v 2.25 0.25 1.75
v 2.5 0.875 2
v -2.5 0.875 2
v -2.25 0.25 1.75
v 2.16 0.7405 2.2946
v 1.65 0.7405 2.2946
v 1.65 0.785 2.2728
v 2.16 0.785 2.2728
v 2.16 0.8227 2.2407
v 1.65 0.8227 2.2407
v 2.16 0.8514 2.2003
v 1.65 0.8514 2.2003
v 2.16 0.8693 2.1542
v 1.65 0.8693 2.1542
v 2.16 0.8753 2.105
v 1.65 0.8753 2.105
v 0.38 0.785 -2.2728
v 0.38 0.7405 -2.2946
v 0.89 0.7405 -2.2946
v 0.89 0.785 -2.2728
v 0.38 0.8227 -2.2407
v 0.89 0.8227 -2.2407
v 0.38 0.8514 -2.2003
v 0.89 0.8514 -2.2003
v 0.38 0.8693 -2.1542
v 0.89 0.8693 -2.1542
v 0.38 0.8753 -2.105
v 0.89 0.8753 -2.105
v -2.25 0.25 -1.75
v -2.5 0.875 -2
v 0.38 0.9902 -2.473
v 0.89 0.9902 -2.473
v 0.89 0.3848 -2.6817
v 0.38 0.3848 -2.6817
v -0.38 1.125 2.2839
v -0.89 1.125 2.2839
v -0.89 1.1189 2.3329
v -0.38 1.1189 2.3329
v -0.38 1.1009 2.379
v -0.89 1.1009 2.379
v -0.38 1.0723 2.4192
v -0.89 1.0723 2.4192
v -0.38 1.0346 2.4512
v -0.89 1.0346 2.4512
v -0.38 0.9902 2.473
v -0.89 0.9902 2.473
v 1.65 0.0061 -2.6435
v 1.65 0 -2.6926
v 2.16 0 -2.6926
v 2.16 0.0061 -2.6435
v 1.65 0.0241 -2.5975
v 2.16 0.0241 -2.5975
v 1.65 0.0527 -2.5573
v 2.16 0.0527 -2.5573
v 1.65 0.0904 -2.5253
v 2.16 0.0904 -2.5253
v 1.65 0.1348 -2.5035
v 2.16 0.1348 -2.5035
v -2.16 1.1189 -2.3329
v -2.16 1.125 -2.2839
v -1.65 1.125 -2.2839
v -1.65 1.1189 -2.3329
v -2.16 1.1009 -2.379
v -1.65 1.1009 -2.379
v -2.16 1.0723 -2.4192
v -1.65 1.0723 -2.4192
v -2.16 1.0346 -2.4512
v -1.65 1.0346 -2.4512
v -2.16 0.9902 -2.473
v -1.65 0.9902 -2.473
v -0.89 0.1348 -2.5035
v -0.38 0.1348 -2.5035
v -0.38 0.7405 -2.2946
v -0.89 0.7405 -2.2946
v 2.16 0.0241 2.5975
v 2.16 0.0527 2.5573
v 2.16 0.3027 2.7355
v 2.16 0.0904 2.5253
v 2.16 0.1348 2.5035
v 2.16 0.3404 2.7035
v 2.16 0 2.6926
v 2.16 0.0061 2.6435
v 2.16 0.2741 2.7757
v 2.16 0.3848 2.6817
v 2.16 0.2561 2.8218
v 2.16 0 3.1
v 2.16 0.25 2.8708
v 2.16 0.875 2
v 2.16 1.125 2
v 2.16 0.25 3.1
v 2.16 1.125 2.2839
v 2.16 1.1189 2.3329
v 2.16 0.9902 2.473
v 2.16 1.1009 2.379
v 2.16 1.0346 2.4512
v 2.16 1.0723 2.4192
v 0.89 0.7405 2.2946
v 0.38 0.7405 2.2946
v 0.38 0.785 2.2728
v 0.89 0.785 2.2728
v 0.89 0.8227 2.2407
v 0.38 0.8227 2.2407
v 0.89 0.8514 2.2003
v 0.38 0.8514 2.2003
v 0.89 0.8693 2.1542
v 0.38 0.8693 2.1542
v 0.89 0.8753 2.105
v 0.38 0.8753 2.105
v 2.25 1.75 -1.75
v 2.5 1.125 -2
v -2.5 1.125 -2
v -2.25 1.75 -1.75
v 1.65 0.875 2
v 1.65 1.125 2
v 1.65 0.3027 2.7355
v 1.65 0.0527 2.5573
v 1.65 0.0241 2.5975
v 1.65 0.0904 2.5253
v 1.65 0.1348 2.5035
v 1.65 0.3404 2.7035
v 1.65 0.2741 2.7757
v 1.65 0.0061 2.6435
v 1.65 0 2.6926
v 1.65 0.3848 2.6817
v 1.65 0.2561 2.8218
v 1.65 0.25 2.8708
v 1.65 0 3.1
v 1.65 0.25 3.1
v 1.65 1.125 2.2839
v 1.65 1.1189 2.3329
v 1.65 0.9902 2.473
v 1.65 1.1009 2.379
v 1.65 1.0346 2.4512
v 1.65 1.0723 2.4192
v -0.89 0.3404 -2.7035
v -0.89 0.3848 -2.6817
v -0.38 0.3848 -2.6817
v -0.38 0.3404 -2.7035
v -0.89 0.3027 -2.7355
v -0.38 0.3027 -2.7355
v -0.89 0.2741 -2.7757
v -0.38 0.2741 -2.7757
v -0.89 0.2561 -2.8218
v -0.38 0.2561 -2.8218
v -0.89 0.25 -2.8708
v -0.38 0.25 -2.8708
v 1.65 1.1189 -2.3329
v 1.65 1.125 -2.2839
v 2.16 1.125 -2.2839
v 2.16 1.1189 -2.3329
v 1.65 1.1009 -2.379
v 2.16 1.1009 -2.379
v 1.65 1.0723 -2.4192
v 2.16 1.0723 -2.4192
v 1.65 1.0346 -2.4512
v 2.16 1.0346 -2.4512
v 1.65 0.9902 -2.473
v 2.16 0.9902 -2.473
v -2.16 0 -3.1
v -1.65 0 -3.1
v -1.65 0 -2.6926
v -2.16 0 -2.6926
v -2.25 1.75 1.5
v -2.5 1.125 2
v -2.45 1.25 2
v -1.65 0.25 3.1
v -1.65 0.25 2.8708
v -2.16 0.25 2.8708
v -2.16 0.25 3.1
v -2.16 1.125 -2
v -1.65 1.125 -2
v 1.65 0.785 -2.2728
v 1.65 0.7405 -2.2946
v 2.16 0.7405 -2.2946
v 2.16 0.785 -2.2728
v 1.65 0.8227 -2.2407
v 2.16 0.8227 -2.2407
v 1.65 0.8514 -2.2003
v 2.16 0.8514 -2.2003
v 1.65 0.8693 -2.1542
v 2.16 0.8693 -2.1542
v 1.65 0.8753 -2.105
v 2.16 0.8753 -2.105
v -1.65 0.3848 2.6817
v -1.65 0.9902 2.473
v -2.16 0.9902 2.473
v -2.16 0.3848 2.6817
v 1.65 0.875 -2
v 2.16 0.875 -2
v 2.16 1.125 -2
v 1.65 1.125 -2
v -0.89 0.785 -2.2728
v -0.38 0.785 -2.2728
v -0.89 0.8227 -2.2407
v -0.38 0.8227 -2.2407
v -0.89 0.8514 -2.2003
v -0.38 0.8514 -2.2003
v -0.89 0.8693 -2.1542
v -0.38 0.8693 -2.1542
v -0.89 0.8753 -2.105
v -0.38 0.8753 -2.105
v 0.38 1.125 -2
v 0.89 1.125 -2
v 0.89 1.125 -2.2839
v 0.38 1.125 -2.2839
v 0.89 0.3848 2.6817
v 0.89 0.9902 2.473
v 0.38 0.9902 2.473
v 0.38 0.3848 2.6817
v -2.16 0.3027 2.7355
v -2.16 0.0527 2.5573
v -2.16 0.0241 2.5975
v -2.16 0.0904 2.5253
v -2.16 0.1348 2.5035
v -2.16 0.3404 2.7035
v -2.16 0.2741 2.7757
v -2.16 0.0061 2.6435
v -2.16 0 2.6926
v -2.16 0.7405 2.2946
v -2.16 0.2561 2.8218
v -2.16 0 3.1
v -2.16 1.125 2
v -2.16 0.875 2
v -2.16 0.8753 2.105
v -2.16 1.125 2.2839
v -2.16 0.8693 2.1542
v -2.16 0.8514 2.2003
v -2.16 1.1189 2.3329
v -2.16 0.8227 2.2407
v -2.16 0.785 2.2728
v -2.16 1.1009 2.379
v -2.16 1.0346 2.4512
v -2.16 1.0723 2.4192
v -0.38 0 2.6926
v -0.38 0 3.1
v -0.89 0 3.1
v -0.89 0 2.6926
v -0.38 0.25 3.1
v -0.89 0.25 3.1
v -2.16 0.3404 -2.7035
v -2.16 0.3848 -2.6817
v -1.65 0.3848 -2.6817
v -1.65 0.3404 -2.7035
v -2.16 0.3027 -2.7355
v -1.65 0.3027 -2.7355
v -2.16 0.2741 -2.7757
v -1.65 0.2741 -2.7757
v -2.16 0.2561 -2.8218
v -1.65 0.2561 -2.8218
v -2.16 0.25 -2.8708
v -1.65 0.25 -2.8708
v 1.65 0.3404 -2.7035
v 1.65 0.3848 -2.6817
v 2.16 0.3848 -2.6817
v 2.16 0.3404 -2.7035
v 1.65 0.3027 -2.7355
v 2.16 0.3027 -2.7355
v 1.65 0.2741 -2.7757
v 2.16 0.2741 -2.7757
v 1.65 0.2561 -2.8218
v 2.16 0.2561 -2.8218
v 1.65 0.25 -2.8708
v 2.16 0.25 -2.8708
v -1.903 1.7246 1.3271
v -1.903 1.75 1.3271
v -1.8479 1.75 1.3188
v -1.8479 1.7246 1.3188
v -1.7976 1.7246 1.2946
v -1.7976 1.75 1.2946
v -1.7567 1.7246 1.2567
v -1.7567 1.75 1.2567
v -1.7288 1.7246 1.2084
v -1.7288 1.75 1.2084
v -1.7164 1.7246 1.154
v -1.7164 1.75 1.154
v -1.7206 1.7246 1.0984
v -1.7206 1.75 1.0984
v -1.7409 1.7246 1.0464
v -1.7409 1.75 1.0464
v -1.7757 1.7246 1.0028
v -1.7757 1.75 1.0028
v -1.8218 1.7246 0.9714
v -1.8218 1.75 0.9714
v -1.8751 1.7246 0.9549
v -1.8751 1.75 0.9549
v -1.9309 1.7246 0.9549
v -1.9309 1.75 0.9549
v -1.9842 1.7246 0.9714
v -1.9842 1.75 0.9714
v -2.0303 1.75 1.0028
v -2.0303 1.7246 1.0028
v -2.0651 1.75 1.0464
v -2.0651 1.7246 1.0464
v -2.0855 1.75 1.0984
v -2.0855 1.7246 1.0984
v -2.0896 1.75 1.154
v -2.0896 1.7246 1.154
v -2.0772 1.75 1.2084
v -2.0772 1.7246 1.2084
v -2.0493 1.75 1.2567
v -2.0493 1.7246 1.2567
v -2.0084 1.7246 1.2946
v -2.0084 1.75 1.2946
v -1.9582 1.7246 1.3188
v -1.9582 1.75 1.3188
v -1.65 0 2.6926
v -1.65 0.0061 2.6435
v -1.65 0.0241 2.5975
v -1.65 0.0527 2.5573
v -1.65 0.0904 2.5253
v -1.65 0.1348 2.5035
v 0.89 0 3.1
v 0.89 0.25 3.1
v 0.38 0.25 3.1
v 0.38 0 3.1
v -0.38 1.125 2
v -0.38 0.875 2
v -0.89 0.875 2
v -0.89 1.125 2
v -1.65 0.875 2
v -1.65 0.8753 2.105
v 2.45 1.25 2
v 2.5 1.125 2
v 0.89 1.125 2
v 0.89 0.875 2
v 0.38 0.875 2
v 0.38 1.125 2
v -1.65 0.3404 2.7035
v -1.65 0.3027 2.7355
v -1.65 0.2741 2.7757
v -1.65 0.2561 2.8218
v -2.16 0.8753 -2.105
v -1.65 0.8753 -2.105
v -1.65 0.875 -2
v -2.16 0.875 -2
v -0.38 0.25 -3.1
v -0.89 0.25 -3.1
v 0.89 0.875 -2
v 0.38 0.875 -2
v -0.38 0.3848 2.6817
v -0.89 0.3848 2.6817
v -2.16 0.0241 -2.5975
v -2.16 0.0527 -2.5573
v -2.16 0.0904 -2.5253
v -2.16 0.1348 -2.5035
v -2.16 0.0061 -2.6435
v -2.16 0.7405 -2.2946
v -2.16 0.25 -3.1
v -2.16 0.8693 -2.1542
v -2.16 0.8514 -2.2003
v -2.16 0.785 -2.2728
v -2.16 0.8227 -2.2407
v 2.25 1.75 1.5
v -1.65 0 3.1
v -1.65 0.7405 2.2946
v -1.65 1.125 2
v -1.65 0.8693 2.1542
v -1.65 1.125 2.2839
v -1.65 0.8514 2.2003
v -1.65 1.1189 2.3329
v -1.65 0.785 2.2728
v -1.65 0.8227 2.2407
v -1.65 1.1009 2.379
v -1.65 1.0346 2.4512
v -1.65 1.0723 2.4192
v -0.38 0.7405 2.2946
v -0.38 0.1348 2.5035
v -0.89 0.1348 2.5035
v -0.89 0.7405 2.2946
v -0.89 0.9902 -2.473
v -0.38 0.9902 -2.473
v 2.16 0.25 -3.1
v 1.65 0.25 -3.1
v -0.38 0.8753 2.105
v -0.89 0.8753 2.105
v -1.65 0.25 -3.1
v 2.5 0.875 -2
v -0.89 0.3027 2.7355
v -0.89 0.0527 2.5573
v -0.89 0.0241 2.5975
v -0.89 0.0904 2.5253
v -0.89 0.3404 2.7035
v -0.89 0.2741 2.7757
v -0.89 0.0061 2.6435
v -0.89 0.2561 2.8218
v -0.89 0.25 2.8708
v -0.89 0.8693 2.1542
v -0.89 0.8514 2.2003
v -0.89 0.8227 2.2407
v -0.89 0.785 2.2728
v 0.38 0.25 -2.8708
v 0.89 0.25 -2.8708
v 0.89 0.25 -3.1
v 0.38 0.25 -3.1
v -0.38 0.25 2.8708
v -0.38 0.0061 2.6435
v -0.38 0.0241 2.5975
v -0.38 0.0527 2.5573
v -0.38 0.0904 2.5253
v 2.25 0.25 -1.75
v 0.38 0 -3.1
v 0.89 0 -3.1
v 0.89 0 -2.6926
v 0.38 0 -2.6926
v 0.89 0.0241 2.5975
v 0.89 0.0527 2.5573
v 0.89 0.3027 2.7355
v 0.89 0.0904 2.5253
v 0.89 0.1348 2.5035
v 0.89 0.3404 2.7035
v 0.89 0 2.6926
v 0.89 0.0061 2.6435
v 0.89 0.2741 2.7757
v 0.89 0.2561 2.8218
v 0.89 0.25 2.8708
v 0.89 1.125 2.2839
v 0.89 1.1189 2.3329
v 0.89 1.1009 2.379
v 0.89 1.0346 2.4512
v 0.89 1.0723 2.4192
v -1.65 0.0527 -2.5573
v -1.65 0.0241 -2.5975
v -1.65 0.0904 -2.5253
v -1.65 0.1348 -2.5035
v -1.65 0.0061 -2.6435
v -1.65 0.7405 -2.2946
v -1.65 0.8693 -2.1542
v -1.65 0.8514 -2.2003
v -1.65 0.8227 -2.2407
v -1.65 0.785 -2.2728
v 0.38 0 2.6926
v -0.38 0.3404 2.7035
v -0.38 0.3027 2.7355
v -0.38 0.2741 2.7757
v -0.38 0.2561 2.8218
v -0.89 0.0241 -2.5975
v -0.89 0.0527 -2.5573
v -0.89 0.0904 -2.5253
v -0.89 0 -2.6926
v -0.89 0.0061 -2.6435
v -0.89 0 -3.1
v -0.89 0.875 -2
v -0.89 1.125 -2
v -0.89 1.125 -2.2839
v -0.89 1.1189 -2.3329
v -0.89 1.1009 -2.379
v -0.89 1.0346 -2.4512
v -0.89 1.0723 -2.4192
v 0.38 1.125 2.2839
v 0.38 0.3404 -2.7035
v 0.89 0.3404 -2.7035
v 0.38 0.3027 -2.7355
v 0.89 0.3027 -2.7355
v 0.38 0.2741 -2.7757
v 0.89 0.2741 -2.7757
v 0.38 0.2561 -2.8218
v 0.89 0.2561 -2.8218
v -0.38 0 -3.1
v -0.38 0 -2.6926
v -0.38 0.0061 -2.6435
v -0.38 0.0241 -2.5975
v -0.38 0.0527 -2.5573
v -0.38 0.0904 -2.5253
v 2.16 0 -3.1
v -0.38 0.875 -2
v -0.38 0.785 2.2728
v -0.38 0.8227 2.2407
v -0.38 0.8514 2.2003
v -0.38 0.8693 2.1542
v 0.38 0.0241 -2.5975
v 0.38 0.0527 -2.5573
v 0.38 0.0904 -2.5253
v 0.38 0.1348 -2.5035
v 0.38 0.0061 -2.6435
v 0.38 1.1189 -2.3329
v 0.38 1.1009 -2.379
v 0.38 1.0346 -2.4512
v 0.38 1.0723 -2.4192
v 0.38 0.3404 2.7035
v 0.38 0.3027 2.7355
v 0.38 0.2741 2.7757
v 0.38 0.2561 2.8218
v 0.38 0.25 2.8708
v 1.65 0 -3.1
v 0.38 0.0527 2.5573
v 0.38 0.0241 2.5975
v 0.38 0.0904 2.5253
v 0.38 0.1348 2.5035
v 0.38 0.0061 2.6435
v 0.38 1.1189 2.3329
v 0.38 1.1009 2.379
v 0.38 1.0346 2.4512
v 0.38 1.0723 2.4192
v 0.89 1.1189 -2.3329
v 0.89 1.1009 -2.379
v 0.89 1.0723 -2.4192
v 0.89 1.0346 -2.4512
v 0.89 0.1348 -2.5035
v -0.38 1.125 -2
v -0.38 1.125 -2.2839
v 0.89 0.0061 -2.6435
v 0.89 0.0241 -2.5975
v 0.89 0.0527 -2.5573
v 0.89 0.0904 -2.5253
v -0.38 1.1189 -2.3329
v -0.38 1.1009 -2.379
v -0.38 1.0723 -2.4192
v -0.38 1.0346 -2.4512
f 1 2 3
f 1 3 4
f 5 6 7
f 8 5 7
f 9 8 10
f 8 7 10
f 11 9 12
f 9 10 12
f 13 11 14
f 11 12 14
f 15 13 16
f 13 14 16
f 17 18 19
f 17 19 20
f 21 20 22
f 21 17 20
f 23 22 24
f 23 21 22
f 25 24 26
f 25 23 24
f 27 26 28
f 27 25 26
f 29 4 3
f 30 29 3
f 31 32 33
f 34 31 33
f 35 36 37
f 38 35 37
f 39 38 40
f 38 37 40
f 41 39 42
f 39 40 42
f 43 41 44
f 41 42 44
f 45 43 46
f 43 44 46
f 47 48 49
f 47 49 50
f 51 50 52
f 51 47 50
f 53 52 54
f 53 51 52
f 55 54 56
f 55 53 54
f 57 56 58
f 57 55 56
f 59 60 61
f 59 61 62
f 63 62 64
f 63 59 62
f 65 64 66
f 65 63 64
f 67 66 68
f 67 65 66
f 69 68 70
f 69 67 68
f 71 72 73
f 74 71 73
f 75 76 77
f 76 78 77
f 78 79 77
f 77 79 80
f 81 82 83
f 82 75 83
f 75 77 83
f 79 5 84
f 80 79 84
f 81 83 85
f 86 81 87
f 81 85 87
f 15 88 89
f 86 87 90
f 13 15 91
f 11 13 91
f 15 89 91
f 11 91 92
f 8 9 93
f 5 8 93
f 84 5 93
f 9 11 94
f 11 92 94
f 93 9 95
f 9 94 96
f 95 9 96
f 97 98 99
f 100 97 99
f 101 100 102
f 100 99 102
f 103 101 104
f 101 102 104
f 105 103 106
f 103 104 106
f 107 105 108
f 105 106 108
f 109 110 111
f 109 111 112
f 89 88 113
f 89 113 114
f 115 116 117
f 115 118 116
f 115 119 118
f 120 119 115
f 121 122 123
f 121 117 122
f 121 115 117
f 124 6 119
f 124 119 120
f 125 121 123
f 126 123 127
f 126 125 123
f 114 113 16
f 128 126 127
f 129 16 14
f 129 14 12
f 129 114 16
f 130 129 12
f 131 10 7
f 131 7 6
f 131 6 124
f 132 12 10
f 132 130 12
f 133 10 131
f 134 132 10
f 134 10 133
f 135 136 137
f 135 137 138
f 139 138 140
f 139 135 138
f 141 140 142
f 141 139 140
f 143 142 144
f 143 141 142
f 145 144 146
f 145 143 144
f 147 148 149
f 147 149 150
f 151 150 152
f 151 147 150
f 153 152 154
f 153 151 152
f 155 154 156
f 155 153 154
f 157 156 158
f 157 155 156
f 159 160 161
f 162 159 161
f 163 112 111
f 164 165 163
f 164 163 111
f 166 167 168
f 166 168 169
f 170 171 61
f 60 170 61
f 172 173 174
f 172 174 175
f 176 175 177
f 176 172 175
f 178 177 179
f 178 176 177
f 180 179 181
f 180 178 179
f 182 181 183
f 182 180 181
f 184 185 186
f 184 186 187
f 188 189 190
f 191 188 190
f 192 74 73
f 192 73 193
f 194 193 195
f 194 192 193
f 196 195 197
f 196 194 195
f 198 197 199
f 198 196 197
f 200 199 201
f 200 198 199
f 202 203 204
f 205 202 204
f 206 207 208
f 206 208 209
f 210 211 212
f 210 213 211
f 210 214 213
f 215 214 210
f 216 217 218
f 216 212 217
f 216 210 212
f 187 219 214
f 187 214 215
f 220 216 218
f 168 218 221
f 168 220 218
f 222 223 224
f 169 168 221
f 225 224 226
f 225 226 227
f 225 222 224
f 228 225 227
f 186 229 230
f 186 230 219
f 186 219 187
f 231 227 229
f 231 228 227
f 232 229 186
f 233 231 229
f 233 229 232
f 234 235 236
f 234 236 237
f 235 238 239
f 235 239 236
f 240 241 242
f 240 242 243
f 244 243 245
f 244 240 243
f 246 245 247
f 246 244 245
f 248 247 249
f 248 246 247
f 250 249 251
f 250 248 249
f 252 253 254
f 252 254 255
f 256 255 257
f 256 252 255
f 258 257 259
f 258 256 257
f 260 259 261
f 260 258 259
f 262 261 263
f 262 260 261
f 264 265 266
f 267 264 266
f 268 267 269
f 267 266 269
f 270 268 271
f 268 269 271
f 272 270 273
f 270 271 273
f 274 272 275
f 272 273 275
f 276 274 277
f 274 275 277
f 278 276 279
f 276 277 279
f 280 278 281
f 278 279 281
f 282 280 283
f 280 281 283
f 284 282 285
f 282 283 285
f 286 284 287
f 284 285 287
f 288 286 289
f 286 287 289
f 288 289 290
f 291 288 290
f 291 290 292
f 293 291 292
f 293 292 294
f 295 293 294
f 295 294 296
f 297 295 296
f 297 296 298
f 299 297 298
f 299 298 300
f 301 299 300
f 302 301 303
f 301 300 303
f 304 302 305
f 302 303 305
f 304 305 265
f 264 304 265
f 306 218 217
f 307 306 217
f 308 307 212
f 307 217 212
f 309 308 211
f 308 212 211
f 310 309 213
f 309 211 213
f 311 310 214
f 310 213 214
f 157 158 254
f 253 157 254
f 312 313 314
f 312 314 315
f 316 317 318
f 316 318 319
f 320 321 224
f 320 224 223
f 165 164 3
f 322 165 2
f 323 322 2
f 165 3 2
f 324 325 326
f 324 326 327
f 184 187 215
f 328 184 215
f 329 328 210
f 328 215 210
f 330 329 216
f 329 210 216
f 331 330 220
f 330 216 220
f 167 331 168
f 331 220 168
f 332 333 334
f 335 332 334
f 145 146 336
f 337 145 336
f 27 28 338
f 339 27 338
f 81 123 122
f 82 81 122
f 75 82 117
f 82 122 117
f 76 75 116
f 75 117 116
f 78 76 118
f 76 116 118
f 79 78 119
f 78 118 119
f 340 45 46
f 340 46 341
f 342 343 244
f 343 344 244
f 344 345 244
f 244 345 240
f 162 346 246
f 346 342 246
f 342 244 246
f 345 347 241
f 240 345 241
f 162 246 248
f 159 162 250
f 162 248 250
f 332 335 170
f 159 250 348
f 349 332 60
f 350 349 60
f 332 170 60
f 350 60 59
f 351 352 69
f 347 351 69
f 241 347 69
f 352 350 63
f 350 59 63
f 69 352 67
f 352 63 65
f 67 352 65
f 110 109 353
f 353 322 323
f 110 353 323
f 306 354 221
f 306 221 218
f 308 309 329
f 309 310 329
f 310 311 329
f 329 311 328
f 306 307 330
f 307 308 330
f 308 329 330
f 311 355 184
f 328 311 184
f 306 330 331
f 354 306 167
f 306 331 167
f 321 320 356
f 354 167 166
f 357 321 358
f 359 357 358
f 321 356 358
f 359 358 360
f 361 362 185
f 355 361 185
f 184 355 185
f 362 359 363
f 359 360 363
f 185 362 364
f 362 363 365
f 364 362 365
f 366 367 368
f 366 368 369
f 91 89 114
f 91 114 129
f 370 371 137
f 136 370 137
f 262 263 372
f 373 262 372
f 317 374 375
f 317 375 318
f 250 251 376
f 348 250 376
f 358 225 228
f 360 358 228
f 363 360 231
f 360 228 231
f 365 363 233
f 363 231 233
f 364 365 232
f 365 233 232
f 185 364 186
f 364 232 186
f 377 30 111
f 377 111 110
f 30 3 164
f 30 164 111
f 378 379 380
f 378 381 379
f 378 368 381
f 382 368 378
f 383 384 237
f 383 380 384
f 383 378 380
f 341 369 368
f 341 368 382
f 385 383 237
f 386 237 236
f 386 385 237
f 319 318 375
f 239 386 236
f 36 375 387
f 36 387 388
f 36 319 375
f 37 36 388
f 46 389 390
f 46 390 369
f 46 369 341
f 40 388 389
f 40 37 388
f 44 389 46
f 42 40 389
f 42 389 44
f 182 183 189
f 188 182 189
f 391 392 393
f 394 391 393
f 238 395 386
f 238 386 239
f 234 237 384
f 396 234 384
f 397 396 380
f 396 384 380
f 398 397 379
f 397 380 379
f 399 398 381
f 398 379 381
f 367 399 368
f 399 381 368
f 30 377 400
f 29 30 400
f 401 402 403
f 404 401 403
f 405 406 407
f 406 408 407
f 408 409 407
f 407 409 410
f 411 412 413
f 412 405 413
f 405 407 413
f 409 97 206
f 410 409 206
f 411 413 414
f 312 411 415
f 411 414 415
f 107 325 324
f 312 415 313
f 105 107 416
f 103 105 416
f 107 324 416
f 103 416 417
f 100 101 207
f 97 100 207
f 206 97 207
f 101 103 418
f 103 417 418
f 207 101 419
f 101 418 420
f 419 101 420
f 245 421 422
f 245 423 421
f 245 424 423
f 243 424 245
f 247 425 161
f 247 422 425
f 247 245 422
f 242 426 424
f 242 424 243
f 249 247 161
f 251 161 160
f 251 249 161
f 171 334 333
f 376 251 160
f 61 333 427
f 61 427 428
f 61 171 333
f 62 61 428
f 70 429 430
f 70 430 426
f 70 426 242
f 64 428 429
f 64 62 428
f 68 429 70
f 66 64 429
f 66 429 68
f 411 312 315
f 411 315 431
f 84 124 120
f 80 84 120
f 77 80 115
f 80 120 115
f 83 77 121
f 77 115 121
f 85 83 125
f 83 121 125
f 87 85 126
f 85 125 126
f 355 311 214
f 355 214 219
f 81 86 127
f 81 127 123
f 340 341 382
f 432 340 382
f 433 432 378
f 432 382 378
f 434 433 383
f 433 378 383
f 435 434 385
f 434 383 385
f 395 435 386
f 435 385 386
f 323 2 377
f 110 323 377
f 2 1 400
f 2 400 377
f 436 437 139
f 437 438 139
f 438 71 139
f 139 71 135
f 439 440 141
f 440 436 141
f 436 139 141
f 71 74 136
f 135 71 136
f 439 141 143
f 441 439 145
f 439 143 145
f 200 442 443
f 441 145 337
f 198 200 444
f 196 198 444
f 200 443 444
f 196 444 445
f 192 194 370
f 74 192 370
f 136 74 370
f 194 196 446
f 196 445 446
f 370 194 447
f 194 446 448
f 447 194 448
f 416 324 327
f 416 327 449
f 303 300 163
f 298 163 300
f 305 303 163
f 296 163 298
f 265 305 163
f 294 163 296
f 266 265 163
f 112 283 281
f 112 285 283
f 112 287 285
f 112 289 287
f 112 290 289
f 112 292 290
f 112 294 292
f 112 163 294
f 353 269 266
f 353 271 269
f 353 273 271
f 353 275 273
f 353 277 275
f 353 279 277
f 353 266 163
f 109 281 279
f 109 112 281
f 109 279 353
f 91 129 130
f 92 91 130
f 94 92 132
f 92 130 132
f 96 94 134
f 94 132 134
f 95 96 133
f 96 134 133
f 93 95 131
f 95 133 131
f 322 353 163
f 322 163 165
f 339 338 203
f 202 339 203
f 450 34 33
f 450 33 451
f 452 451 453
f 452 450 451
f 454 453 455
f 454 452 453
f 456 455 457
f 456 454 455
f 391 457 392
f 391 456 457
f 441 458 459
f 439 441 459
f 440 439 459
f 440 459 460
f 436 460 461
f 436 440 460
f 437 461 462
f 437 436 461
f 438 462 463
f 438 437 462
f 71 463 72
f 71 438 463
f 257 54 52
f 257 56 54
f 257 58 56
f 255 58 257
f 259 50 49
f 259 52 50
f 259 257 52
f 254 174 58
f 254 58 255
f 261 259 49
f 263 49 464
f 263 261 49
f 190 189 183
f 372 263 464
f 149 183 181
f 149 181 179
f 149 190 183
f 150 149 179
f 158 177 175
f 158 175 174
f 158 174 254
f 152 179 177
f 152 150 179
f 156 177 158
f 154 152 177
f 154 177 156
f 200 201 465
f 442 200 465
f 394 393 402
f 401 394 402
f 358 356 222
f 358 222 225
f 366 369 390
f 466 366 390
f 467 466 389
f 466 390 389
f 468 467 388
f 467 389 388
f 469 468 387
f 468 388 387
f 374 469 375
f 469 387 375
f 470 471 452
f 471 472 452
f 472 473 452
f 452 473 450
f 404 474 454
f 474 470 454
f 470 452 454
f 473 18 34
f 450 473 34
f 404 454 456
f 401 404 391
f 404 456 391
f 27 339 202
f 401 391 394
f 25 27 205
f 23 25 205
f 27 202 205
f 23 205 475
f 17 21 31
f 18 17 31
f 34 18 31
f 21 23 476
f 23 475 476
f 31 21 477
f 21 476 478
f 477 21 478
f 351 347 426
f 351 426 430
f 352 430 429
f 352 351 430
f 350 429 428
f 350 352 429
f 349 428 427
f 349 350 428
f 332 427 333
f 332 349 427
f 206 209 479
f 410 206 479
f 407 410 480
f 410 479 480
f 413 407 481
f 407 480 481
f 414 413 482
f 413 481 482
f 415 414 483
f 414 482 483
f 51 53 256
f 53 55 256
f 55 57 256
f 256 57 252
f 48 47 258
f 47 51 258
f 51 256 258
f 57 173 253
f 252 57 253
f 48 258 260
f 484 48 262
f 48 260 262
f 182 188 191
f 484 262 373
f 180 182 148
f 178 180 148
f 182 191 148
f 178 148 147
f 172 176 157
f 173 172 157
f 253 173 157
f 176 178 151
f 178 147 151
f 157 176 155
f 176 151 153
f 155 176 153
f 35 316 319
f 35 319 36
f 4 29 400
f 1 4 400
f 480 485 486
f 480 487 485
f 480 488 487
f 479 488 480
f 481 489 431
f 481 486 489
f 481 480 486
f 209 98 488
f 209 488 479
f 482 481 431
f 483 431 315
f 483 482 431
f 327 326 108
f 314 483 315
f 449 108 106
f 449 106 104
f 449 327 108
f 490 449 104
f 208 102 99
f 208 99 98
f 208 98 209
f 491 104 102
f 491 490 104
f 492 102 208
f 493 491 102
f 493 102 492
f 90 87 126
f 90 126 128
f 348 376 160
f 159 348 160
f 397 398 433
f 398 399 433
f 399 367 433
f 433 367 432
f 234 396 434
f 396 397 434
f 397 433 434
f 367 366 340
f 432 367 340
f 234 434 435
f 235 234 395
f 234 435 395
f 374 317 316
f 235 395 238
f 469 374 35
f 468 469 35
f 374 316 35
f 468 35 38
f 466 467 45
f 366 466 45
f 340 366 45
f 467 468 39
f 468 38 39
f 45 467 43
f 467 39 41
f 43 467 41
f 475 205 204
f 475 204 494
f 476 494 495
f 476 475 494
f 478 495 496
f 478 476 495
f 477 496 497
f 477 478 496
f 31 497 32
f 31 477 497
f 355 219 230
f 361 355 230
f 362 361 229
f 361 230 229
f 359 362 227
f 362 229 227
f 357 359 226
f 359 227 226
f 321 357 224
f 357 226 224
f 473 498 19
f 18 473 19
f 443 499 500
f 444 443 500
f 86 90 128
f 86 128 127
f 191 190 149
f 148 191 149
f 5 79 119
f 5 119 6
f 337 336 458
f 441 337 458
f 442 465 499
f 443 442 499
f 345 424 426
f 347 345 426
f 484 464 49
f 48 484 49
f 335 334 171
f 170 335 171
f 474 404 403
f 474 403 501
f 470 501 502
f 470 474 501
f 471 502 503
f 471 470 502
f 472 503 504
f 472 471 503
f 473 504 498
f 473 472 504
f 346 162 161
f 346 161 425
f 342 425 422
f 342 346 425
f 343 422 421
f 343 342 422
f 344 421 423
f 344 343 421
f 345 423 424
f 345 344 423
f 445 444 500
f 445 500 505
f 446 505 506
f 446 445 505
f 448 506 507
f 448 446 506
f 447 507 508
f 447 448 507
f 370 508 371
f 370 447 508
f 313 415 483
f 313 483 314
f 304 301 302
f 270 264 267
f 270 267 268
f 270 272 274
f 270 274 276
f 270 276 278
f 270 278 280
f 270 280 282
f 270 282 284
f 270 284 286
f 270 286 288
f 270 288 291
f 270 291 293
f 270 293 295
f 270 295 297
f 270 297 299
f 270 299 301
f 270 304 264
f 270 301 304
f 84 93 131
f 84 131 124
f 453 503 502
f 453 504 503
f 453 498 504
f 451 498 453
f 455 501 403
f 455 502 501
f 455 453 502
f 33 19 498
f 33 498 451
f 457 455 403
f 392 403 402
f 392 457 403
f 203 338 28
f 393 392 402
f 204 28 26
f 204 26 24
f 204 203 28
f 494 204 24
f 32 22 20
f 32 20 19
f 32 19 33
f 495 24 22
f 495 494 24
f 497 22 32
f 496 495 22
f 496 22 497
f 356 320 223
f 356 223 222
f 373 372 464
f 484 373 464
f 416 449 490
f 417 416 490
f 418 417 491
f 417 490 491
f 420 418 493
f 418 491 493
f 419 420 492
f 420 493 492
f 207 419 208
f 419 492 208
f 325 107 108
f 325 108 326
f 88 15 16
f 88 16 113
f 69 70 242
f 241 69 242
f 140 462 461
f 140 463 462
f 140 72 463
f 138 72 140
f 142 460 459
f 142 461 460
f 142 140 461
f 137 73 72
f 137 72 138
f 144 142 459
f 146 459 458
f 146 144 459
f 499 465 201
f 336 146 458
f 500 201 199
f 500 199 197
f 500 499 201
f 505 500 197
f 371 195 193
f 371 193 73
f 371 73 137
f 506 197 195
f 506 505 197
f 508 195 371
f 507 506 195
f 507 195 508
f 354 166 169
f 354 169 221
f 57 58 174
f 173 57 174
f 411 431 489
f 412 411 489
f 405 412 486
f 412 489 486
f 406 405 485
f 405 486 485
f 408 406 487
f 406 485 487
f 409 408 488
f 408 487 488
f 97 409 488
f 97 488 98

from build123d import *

# Parameters (mm, degrees)
BOSS_EXTRUDE1_START = 0.25
SKETCH1_W           = 5
SKETCH1_H           = 4
BOSS_EXTRUDE1_DEPTH = 1.5
CUT_EXTRUDE1_DEPTH  = 6.031152949
CUT_EXTRUDE2_DEPTH  = 6.662375826
SKETCH4_R           = 0.187140245
CUT_EXTRUDE3_DEPTH  = 0.0254
BOSS_EXTRUDE3_DEPTH = 5
FILLET1_R           = 0.2
SKETCH7_W           = 0.34
SKETCH7_H           = 1.1
SKETCH7_W_2         = 0.76
CUT_EXTRUDE4_DEPTH  = 5.35


with BuildPart() as part:
    # Sketch1 → Boss-Extrude1 (new body)
    with BuildSketch(Plane(origin=(0, 0, 0), x_dir=(1, 0, 0), z_dir=(0, 1, 0)).offset(BOSS_EXTRUDE1_START)):
        Rectangle(SKETCH1_W, SKETCH1_H)
    extrude(amount=BOSS_EXTRUDE1_DEPTH)

    # Sketch2 → Cut-Extrude1 (cut, through all)
    with BuildSketch(Plane.XY.offset(2)):
        Polygon((-2.5, 1.75), (-2.25, 1.75), (-2.5, 1.125), align=None)
        Polygon((-2.5, 0.875), (-2.5, 0.25), (-2.25, 0.25), align=None)
        Polygon((2.5, 0.25), (2.25, 0.25), (2.5, 0.875), align=None)
        Polygon((2.5, 1.125), (2.5, 1.75), (2.25, 1.75), align=None)
    extrude(amount=-CUT_EXTRUDE1_DEPTH, mode=Mode.SUBTRACT)

    # Sketch3 → Cut-Extrude2 (cut, through all)
    with BuildSketch(Plane.ZY.offset(2.5)):
        Polygon((1.5, 1.75), (2, 1.25), (2, 1.75), align=None)
        Polygon((2, 0.875), (1.75, 0.25), (2, 0.25), align=None)
        Polygon((-2, 0.25), (-2, 0.875), (-1.75, 0.25), align=None)
        Polygon((-2, 1.125), (-1.75, 1.75), (-2, 1.75), align=None)
    extrude(amount=-CUT_EXTRUDE2_DEPTH, mode=Mode.SUBTRACT)

    # Sketch4 → Cut-Extrude3 (cut)
    with BuildSketch(Plane(origin=(0, 1.75, 0), x_dir=(1, 0, 0), z_dir=(0, 1, 0))):
        with Locations(Location((-1.903012969, -1.14, 0), (0, 0, 270))):
            Circle(SKETCH4_R)
    extrude(amount=-CUT_EXTRUDE3_DEPTH, mode=Mode.SUBTRACT)


with BuildPart() as body_2:
    # Sketch5 → Boss-Extrude3 (new body)
    with BuildSketch(Plane(origin=(2.5, 0, 0), x_dir=(0, 0, -1), z_dir=(1, 0, 0))):
        Polygon((2, 1.125), (2.426472421, 1.125), (2.728232142, 0.25), (3.1, 0.25), (3.1, 0), (2.55, 0), (2.247997903, 0.875702809), (2, 0.875), align=None)
    extrude(amount=-BOSS_EXTRUDE3_DEPTH)

    # Fillet1
    fillet1_edges = [body_2.edges().sort_by_distance(p)[0] for p in [
        (0, 1.125, -2.426472421),
        (0, 0.25, -2.728232142),
        (0, 0, -2.55),
        (0, 0.875702809, -2.247997903),
    ]]
    fillet(fillet1_edges, radius=FILLET1_R)

    # Sketch7 → Cut-Extrude4 (cut, through all)
    with BuildSketch(Plane(origin=(0, 1.75, 0), x_dir=(1, 0, 0), z_dir=(0, 1, 0))):
        with Locations((-2.33, 2.55)):
            Rectangle(SKETCH7_W, SKETCH7_H)
        with Locations((-1.27, 2.55)):
            Rectangle(SKETCH7_W_2, SKETCH7_H)
        with Locations((0, 2.55)):
            Rectangle(SKETCH7_W_2, SKETCH7_H)
        with Locations((1.27, 2.55)):
            Rectangle(SKETCH7_W_2, SKETCH7_H)
        with Locations((2.33, 2.55)):
            Rectangle(SKETCH7_W, SKETCH7_H)
    extrude(amount=-CUT_EXTRUDE4_DEPTH, mode=Mode.SUBTRACT)


with BuildPart() as cut_extrude4_piece_1:
    # of the separate pieces the step leaves, piece 1, a body of its own (cut_extrude4_pieces)
    add(body_2.part.solids().sort_by_distance((2.16, 1.125, -2.283886708))[0])


with BuildPart() as cut_extrude4_piece_2:
    # of the separate pieces the step leaves, piece 2, a body of its own (cut_extrude4_pieces)
    add(body_2.part.solids().sort_by_distance((-0.38, 1.125, -2.283886708))[0])


with BuildPart() as cut_extrude4_piece_3:
    # of the separate pieces the step leaves, piece 3, a body of its own (cut_extrude4_pieces)
    add(body_2.part.solids().sort_by_distance((-1.65, 1.125, -2.283886708))[0])


with BuildPart() as cut_extrude4_piece_4:
    # of the separate pieces the step leaves, piece 4, a body of its own (cut_extrude4_pieces)
    add(body_2.part.solids().sort_by_distance((0.89, 1.125, -2.283886708))[0])


with BuildPart() as body_6:
    # Mirror1: mirrored copy
    add(cut_extrude4_piece_1.part.mirror(Plane.XY))


with BuildPart() as body_7:
    # Mirror1 2: mirrored copy
    add(cut_extrude4_piece_4.part.mirror(Plane.XY))


with BuildPart() as body_8:
    # Mirror1 3: mirrored copy
    add(cut_extrude4_piece_2.part.mirror(Plane.XY))


with BuildPart() as body_9:
    # Mirror1 4: mirrored copy
    add(cut_extrude4_piece_3.part.mirror(Plane.XY))


solid = Compound([part.part, cut_extrude4_piece_1.part, cut_extrude4_piece_2.part, cut_extrude4_piece_3.part, cut_extrude4_piece_4.part, body_6.part, body_7.part, body_8.part, body_9.part])
